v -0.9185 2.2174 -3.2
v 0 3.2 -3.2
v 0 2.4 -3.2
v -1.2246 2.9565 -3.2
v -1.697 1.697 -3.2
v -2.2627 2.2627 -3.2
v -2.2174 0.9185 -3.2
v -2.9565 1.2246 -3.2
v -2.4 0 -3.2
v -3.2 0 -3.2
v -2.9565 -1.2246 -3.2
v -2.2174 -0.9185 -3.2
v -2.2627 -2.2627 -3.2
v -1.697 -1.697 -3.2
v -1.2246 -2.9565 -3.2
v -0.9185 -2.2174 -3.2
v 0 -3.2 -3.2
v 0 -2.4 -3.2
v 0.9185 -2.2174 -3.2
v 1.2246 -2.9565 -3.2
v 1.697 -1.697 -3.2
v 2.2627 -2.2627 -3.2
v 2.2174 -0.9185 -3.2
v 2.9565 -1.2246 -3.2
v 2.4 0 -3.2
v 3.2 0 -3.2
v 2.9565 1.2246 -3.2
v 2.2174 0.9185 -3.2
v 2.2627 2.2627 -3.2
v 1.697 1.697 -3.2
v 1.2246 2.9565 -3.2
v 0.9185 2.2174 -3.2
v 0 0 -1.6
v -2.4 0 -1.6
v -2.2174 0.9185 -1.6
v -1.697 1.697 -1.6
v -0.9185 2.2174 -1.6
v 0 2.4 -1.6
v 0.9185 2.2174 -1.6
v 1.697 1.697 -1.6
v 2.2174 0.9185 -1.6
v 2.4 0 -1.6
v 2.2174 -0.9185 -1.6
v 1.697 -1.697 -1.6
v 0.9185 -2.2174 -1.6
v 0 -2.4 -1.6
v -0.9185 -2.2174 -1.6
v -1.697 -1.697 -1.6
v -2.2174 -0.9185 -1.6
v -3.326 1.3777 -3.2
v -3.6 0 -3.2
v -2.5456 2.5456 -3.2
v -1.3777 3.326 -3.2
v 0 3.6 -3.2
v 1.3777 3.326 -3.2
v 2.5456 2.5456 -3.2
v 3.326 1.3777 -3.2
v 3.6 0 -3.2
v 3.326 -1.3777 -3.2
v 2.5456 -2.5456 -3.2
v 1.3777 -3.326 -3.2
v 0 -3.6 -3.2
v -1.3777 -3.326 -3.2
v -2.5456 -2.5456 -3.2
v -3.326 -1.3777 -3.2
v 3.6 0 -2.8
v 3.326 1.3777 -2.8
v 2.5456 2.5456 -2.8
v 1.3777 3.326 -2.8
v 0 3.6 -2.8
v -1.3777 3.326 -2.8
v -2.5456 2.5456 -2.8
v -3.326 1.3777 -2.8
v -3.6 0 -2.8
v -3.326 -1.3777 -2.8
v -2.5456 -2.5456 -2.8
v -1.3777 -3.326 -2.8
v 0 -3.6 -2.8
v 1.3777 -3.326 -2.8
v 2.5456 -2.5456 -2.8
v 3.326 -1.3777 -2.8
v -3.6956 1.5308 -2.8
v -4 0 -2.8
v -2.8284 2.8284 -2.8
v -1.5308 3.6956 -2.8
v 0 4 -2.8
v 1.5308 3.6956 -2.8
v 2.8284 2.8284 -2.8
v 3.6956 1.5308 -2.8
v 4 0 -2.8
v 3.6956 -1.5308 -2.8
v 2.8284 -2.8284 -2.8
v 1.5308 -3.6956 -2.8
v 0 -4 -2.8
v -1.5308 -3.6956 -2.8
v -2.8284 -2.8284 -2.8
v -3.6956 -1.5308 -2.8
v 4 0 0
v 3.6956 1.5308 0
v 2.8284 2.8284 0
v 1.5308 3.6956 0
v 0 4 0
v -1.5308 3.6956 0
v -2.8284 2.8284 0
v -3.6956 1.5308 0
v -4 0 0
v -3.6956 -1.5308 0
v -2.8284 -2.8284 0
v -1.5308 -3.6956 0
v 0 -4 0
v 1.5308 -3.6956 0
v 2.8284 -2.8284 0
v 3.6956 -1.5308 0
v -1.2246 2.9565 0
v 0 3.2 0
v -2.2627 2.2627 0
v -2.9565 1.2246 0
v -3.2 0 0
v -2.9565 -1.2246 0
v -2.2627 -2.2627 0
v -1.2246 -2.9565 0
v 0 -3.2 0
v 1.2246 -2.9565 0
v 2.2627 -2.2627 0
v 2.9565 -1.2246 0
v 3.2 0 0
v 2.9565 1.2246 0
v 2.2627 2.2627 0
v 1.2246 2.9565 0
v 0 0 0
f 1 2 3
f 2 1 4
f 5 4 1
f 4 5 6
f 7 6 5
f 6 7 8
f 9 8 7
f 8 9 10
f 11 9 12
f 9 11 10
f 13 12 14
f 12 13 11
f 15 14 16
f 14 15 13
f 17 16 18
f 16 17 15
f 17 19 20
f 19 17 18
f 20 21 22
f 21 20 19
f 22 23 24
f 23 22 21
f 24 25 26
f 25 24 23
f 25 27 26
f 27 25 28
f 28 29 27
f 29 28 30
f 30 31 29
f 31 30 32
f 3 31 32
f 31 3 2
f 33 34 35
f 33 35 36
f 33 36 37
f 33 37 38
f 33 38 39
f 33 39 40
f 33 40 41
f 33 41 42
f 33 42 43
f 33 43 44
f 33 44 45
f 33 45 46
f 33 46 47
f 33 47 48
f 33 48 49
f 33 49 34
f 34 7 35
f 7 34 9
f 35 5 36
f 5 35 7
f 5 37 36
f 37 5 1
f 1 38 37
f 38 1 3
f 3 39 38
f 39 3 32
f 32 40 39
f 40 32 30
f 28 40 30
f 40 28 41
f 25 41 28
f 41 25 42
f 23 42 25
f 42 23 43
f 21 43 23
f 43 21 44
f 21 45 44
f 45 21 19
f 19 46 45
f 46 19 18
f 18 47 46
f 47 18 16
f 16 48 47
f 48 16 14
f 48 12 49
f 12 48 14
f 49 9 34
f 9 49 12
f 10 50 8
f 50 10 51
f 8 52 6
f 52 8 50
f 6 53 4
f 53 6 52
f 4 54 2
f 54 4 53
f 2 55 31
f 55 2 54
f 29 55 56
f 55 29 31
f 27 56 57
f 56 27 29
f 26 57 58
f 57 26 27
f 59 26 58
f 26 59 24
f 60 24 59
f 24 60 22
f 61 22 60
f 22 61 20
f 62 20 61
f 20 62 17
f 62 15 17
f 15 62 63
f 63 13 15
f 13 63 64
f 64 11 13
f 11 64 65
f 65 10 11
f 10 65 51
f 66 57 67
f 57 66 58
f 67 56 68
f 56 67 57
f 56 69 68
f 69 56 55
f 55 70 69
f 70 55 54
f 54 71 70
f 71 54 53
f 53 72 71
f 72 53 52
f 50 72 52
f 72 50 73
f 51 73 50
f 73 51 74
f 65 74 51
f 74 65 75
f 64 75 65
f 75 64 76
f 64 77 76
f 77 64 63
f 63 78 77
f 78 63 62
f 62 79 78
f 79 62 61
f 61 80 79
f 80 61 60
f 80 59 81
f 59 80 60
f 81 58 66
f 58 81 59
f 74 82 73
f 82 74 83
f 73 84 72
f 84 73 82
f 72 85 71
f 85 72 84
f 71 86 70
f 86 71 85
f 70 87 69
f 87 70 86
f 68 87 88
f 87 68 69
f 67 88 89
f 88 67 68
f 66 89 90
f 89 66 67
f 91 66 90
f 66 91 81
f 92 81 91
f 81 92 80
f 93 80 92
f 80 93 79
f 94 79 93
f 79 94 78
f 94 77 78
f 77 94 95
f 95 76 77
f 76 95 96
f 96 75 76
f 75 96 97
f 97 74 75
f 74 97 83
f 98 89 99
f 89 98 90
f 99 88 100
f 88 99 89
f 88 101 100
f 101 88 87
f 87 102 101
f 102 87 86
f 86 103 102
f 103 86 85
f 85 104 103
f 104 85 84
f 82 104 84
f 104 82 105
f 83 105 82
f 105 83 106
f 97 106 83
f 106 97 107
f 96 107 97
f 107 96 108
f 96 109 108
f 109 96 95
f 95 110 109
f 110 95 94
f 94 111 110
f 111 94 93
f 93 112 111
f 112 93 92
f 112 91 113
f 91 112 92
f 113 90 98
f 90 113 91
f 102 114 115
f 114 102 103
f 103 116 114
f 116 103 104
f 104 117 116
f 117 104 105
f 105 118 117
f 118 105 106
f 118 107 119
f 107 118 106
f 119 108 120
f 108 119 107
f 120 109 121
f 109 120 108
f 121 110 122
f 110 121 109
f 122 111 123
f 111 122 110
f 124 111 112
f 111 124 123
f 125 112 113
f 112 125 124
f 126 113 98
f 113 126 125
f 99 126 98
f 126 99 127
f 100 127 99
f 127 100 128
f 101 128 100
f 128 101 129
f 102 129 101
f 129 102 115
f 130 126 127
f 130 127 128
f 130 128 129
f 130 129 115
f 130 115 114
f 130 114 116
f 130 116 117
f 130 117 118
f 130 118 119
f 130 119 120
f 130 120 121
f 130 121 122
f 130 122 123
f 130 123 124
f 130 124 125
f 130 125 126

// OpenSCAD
// file: ../p/4-4ring3.scad
use <../lib.scad>
function ldraw_lib__4_4ring3() = [
// 0 Ring  3 x 1.0
// 0 Name: 4-4ring3.dat
// 0 Author: James Jessiman
// 0 !LDRAW_ORG Primitive UPDATE 2009-01
// 0 !LICENSE Licensed under CC BY 4.0 : see CAreadme.txt
// 
// 0 BFC CERTIFY CCW
  [0,"BFC","CERTIFY"],
  [0,"BFC","CCW"],
// 
// 0 !HISTORY 1998-12-15 [PTadmin] Official Update 1998-10
// 0 !HISTORY 2002-04-05 [hafhead] Added BFC statement
// 0 !HISTORY 2002-04-25 [PTadmin] Official Update 2002-02
// 0 !HISTORY 2007-06-24 [PTadmin] Header formatted for Contributor Agreement
// 0 !HISTORY 2008-07-01 [PTadmin] Official Update 2008-01
// 0 !HISTORY 2008-08-26 [cwdee] Switch polygon winding and rename
// 0 !HISTORY 2009-05-02 [PTadmin] Official Update 2009-01
// 
// 
// 4 16 -1.5308 0 3.6956 -1.1481 0 2.7717 0 0 3 0 0 4
  [4,16,-1.5308,0,3.6956,-1.1481,0,2.7717,0,0,3,0,0,4],
// 4 16 -2.8284 0 2.8284 -2.1213 0 2.1213 -1.1481 0 2.7717 -1.5308 0 3.6956
  [4,16,-2.8284,0,2.8284,-2.1213,0,2.1213,-1.1481,0,2.7717,-1.5308,0,3.6956],
// 4 16 -3.6956 0 1.5308 -2.7717 0 1.1481 -2.1213 0 2.1213 -2.8284 0 2.8284
  [4,16,-3.6956,0,1.5308,-2.7717,0,1.1481,-2.1213,0,2.1213,-2.8284,0,2.8284],
// 4 16 -4 0 0 -3 0 0 -2.7717 0 1.1481 -3.6956 0 1.5308
  [4,16,-4,0,0,-3,0,0,-2.7717,0,1.1481,-3.6956,0,1.5308],
// 4 16 -3.6956 0 -1.5308 -2.7717 0 -1.1481 -3 0 0 -4 0 0
  [4,16,-3.6956,0,-1.5308,-2.7717,0,-1.1481,-3,0,0,-4,0,0],
// 4 16 -2.8284 0 -2.8284 -2.1213 0 -2.1213 -2.7717 0 -1.1481 -3.6956 0 -1.5308
  [4,16,-2.8284,0,-2.8284,-2.1213,0,-2.1213,-2.7717,0,-1.1481,-3.6956,0,-1.5308],
// 4 16 -1.5308 0 -3.6956 -1.1481 0 -2.7717 -2.1213 0 -2.1213 -2.8284 0 -2.8284
  [4,16,-1.5308,0,-3.6956,-1.1481,0,-2.7717,-2.1213,0,-2.1213,-2.8284,0,-2.8284],
// 4 16 0 0 -4 0 0 -3 -1.1481 0 -2.7717 -1.5308 0 -3.6956
  [4,16,0,0,-4,0,0,-3,-1.1481,0,-2.7717,-1.5308,0,-3.6956],
// 4 16 1.5308 0 -3.6956 1.1481 0 -2.7717 0 0 -3 0 0 -4
  [4,16,1.5308,0,-3.6956,1.1481,0,-2.7717,0,0,-3,0,0,-4],
// 4 16 2.8284 0 -2.8284 2.1213 0 -2.1213 1.1481 0 -2.7717 1.5308 0 -3.6956
  [4,16,2.8284,0,-2.8284,2.1213,0,-2.1213,1.1481,0,-2.7717,1.5308,0,-3.6956],
// 4 16 3.6956 0 -1.5308 2.7717 0 -1.1481 2.1213 0 -2.1213 2.8284 0 -2.8284
  [4,16,3.6956,0,-1.5308,2.7717,0,-1.1481,2.1213,0,-2.1213,2.8284,0,-2.8284],
// 4 16 4 0 0 3 0 0 2.7717 0 -1.1481 3.6956 0 -1.5308
  [4,16,4,0,0,3,0,0,2.7717,0,-1.1481,3.6956,0,-1.5308],
// 4 16 3.6956 0 1.5308 2.7717 0 1.1481 3 0 0 4 0 0
  [4,16,3.6956,0,1.5308,2.7717,0,1.1481,3,0,0,4,0,0],
// 4 16 2.8284 0 2.8284 2.1213 0 2.1213 2.7717 0 1.1481 3.6956 0 1.5308
  [4,16,2.8284,0,2.8284,2.1213,0,2.1213,2.7717,0,1.1481,3.6956,0,1.5308],
// 4 16 1.5308 0 3.6956 1.1481 0 2.7717 2.1213 0 2.1213 2.8284 0 2.8284
  [4,16,1.5308,0,3.6956,1.1481,0,2.7717,2.1213,0,2.1213,2.8284,0,2.8284],
// 4 16 0 0 4 0 0 3 1.1481 0 2.7717 1.5308 0 3.6956
  [4,16,0,0,4,0,0,3,1.1481,0,2.7717,1.5308,0,3.6956],
// 0
];
module ldraw_lib__4_4ring3(step=0, col=false, unit=2/5, alt=false, line=0.2, solid=!$preview)
    makepoly(ldraw_lib__4_4ring3(), step=step, col=col, unit=unit, alt=alt, line=line, solid=solid);
ldraw_lib__4_4ring3(line=0.2);
// file: ../p/4-4cylc.scad
use <../lib.scad>
use <4-4cyli.scad>
use <4-4disc.scad>
use <4-4edge.scad>
function ldraw_lib__4_4cylc() = [
// 0 Cylinder Closed 1.0
// 0 Name: 4-4cylc.dat
// 0 Author: Alex Taylor [anathema]
// 0 !LDRAW_ORG Primitive UPDATE 2009-02
// 0 !LICENSE Licensed under CC BY 4.0 : see CAreadme.txt
// 
// 0 BFC CERTIFY CCW
  [0,"BFC","CERTIFY"],
  [0,"BFC","CCW"],
// 
// 0 !HISTORY 2008-12-29 [cwdee] Removed one disc
// 0 !HISTORY 2009-09-03 [PTadmin] Official Update 2009-02
// 
// 
// 1 16 0 0 0 1 0 0 0 1 0 0 0 1 4-4edge.dat
  [1,16,0,0,0,1,0,0,0,1,0,0,0,1, ldraw_lib__4_4edge()],
// 1 16 0 1 0 1 0 0 0 1 0 0 0 1 4-4edge.dat
  [1,16,0,1,0,1,0,0,0,1,0,0,0,1, ldraw_lib__4_4edge()],
// 1 16 0 0 0 1 0 0 0 1 0 0 0 1 4-4disc.dat
  [1,16,0,0,0,1,0,0,0,1,0,0,0,1, ldraw_lib__4_4disc()],
// 1 16 0 0 0 1 0 0 0 1 0 0 0 1 4-4cyli.dat
  [1,16,0,0,0,1,0,0,0,1,0,0,0,1, ldraw_lib__4_4cyli()],
// 0
];
module ldraw_lib__4_4cylc(step=0, col=false, unit=2/5, alt=false, line=0.2, solid=!$preview)
    makepoly(ldraw_lib__4_4cylc(), step=step, col=col, unit=unit, alt=alt, line=line, solid=solid);
ldraw_lib__4_4cylc(line=0.2);
// file: ../p/4-4edge.scad
use <../lib.scad>
function ldraw_lib__4_4edge() = [
// 0 Circle 1.0
// 0 Name: 4-4edge.dat
// 0 Author: James Jessiman
// 0 !LDRAW_ORG Primitive UPDATE 2017-01
// 0 !LICENSE Licensed under CC BY 4.0 : see CAreadme.txt
// 
// 0 BFC CERTIFY CCW
  [0,"BFC","CERTIFY"],
  [0,"BFC","CCW"],
// 
// 0 !HISTORY 1998-12-15 [PTadmin] Official Update 1998-10
// 0 !HISTORY 2005-12-28 [PTadmin] Official Update 2005-01
// 0 !HISTORY 2007-06-24 [PTadmin] Header formatted for Contributor Agreement
// 0 !HISTORY 2008-07-01 [PTadmin] Official Update 2008-01
// 0 !HISTORY 2017-01-15 [Steffen] BFCed
// 0 !HISTORY 2017-12-30 [PTadmin] Official Update 2017-01
// 
// 
// 2 24 1 0 0 0.9239 0 0.3827
  [2,24,1,0,0,0.9239,0,0.3827],
// 2 24 0.9239 0 0.3827 0.7071 0 0.7071
  [2,24,0.9239,0,0.3827,0.7071,0,0.7071],
// 2 24 0.7071 0 0.7071 0.3827 0 0.9239
  [2,24,0.7071,0,0.7071,0.3827,0,0.9239],
// 2 24 0.3827 0 0.9239 0 0 1
  [2,24,0.3827,0,0.9239,0,0,1],
// 2 24 0 0 1 -0.3827 0 0.9239
  [2,24,0,0,1,-0.3827,0,0.9239],
// 2 24 -0.3827 0 0.9239 -0.7071 0 0.7071
  [2,24,-0.3827,0,0.9239,-0.7071,0,0.7071],
// 2 24 -0.7071 0 0.7071 -0.9239 0 0.3827
  [2,24,-0.7071,0,0.7071,-0.9239,0,0.3827],
// 2 24 -0.9239 0 0.3827 -1 0 -0
  [2,24,-0.9239,0,0.3827,-1,0,-0],
// 2 24 -1 0 -0 -0.9239 0 -0.3827
  [2,24,-1,0,-0,-0.9239,0,-0.3827],
// 2 24 -0.9239 0 -0.3827 -0.7071 0 -0.7071
  [2,24,-0.9239,0,-0.3827,-0.7071,0,-0.7071],
// 2 24 -0.7071 0 -0.7071 -0.3827 0 -0.9239
  [2,24,-0.7071,0,-0.7071,-0.3827,0,-0.9239],
// 2 24 -0.3827 0 -0.9239 0 0 -1
  [2,24,-0.3827,0,-0.9239,0,0,-1],
// 2 24 0 0 -1 0.3827 0 -0.9239
  [2,24,0,0,-1,0.3827,0,-0.9239],
// 2 24 0.3827 0 -0.9239 0.7071 0 -0.7071
  [2,24,0.3827,0,-0.9239,0.7071,0,-0.7071],
// 2 24 0.7071 0 -0.7071 0.9239 0 -0.3827
  [2,24,0.7071,0,-0.7071,0.9239,0,-0.3827],
// 2 24 0.9239 0 -0.3827 1 0 0
  [2,24,0.9239,0,-0.3827,1,0,0],
];
module ldraw_lib__4_4edge(step=0, col=false, unit=2/5, alt=false, line=0.2, solid=!$preview)
    makepoly(ldraw_lib__4_4edge(), step=step, col=col, unit=unit, alt=alt, line=line, solid=solid);
ldraw_lib__4_4edge(line=0.2);
// file: ../p/4-4cyli.scad
use <../lib.scad>
function ldraw_lib__4_4cyli() = [
// 0 Cylinder 1.0
// 0 Name: 4-4cyli.dat
// 0 Author: James Jessiman
// 0 !LDRAW_ORG Primitive UPDATE 2005-01
// 0 !LICENSE Licensed under CC BY 4.0 : see CAreadme.txt
// 
// 0 BFC CERTIFY CCW
  [0,"BFC","CERTIFY"],
  [0,"BFC","CCW"],
// 
// 0 !HISTORY 1998-12-15 [PTadmin] Official Update 1998-10
// 0 !HISTORY 2002-03-23 [sbliss] Added BFC statement; merged headers from files in distributions LDraw 0.27 and Complete.
// 0 !HISTORY 2002-04-25 [PTadmin] Official Update 2002-02
// 0 !HISTORY 2004-12-14 [guyvivan] BFC CCW
// 0 !HISTORY 2005-12-28 [PTadmin] Official Update 2005-01
// 0 !HISTORY 2007-06-24 [PTadmin] Header formatted for Contributor Agreement
// 0 !HISTORY 2008-07-01 [PTadmin] Official Update 2008-01
// 
// 
// 4 16 1 1 0 0.9239 1 0.3827 0.9239 0 0.3827 1 0 0
  [4,16,1,1,0,0.9239,1,0.3827,0.9239,0,0.3827,1,0,0],
// 5 24 1 0 0 1 1 0 0.9239 0 0.3827 0.9239 0 -0.3827
  [5,24,1,0,0,1,1,0,0.9239,0,0.3827,0.9239,0,-0.3827],
// 4 16 0.9239 1 0.3827 0.7071 1 0.7071 0.7071 0 0.7071 0.9239 0 0.3827
  [4,16,0.9239,1,0.3827,0.7071,1,0.7071,0.7071,0,0.7071,0.9239,0,0.3827],
// 5 24 0.9239 0 0.3827 0.9239 1 0.3827 0.7071 0 0.7071 1 0 0
  [5,24,0.9239,0,0.3827,0.9239,1,0.3827,0.7071,0,0.7071,1,0,0],
// 4 16 0.7071 1 0.7071 0.3827 1 0.9239 0.3827 0 0.9239 0.7071 0 0.7071
  [4,16,0.7071,1,0.7071,0.3827,1,0.9239,0.3827,0,0.9239,0.7071,0,0.7071],
// 5 24 0.7071 0 0.7071 0.7071 1 0.7071 0.3827 0 0.9239 0.9239 0 0.3827
  [5,24,0.7071,0,0.7071,0.7071,1,0.7071,0.3827,0,0.9239,0.9239,0,0.3827],
// 4 16 0.3827 1 0.9239 0 1 1 0 0 1 0.3827 0 0.9239
  [4,16,0.3827,1,0.9239,0,1,1,0,0,1,0.3827,0,0.9239],
// 5 24 0.3827 0 0.9239 0.3827 1 0.9239 0 0 1 0.7071 0 0.7071
  [5,24,0.3827,0,0.9239,0.3827,1,0.9239,0,0,1,0.7071,0,0.7071],
// 4 16 0 1 1 -0.3827 1 0.9239 -0.3827 0 0.9239 0 0 1
  [4,16,0,1,1,-0.3827,1,0.9239,-0.3827,0,0.9239,0,0,1],
// 5 24 0 0 1 0 1 1 -0.3827 0 0.9239 0.3827 0 0.9239
  [5,24,0,0,1,0,1,1,-0.3827,0,0.9239,0.3827,0,0.9239],
// 4 16 -0.3827 1 0.9239 -0.7071 1 0.7071 -0.7071 0 0.7071 -0.3827 0 0.9239
  [4,16,-0.3827,1,0.9239,-0.7071,1,0.7071,-0.7071,0,0.7071,-0.3827,0,0.9239],
// 5 24 -0.3827 0 0.9239 -0.3827 1 0.9239 -0.7071 0 0.7071 0 0 1
  [5,24,-0.3827,0,0.9239,-0.3827,1,0.9239,-0.7071,0,0.7071,0,0,1],
// 4 16 -0.7071 1 0.7071 -0.9239 1 0.3827 -0.9239 0 0.3827 -0.7071 0 0.7071
  [4,16,-0.7071,1,0.7071,-0.9239,1,0.3827,-0.9239,0,0.3827,-0.7071,0,0.7071],
// 5 24 -0.7071 0 0.7071 -0.7071 1 0.7071 -0.9239 0 0.3827 -0.3827 0 0.9239
  [5,24,-0.7071,0,0.7071,-0.7071,1,0.7071,-0.9239,0,0.3827,-0.3827,0,0.9239],
// 4 16 -0.9239 1 0.3827 -1 1 0 -1 0 0 -0.9239 0 0.3827
  [4,16,-0.9239,1,0.3827,-1,1,0,-1,0,0,-0.9239,0,0.3827],
// 5 24 -0.9239 0 0.3827 -0.9239 1 0.3827 -1 0 0 -0.7071 0 0.7071
  [5,24,-0.9239,0,0.3827,-0.9239,1,0.3827,-1,0,0,-0.7071,0,0.7071],
// 4 16 -1 1 0 -0.9239 1 -0.3827 -0.9239 0 -0.3827 -1 0 0
  [4,16,-1,1,0,-0.9239,1,-0.3827,-0.9239,0,-0.3827,-1,0,0],
// 5 24 -1 0 0 -1 1 0 -0.9239 0 -0.3827 -0.9239 0 0.3827
  [5,24,-1,0,0,-1,1,0,-0.9239,0,-0.3827,-0.9239,0,0.3827],
// 4 16 -0.9239 1 -0.3827 -0.7071 1 -0.7071 -0.7071 0 -0.7071 -0.9239 0 -0.3827
  [4,16,-0.9239,1,-0.3827,-0.7071,1,-0.7071,-0.7071,0,-0.7071,-0.9239,0,-0.3827],
// 5 24 -0.9239 0 -0.3827 -0.9239 1 -0.3827 -0.7071 0 -0.7071 -1 0 0
  [5,24,-0.9239,0,-0.3827,-0.9239,1,-0.3827,-0.7071,0,-0.7071,-1,0,0],
// 4 16 -0.7071 1 -0.7071 -0.3827 1 -0.9239 -0.3827 0 -0.9239 -0.7071 0 -0.7071
  [4,16,-0.7071,1,-0.7071,-0.3827,1,-0.9239,-0.3827,0,-0.9239,-0.7071,0,-0.7071],
// 5 24 -0.7071 0 -0.7071 -0.7071 1 -0.7071 -0.3827 0 -0.9239 -0.9239 0 -0.3827
  [5,24,-0.7071,0,-0.7071,-0.7071,1,-0.7071,-0.3827,0,-0.9239,-0.9239,0,-0.3827],
// 4 16 -0.3827 1 -0.9239 0 1 -1 0 0 -1 -0.3827 0 -0.9239
  [4,16,-0.3827,1,-0.9239,0,1,-1,0,0,-1,-0.3827,0,-0.9239],
// 5 24 -0.3827 0 -0.9239 -0.3827 1 -0.9239 0 0 -1 -0.7071 0 -0.7071
  [5,24,-0.3827,0,-0.9239,-0.3827,1,-0.9239,0,0,-1,-0.7071,0,-0.7071],
// 4 16 0 1 -1 0.3827 1 -0.9239 0.3827 0 -0.9239 0 0 -1
  [4,16,0,1,-1,0.3827,1,-0.9239,0.3827,0,-0.9239,0,0,-1],
// 5 24 0 0 -1 0 1 -1 0.3827 0 -0.9239 -0.3827 0 -0.9239
  [5,24,0,0,-1,0,1,-1,0.3827,0,-0.9239,-0.3827,0,-0.9239],
// 4 16 0.3827 1 -0.9239 0.7071 1 -0.7071 0.7071 0 -0.7071 0.3827 0 -0.9239
  [4,16,0.3827,1,-0.9239,0.7071,1,-0.7071,0.7071,0,-0.7071,0.3827,0,-0.9239],
// 5 24 0.3827 0 -0.9239 0.3827 1 -0.9239 0.7071 0 -0.7071 0 0 -1
  [5,24,0.3827,0,-0.9239,0.3827,1,-0.9239,0.7071,0,-0.7071,0,0,-1],
// 4 16 0.7071 1 -0.7071 0.9239 1 -0.3827 0.9239 0 -0.3827 0.7071 0 -0.7071
  [4,16,0.7071,1,-0.7071,0.9239,1,-0.3827,0.9239,0,-0.3827,0.7071,0,-0.7071],
// 5 24 0.7071 0 -0.7071 0.7071 1 -0.7071 0.9239 0 -0.3827 0.3827 0 -0.9239
  [5,24,0.7071,0,-0.7071,0.7071,1,-0.7071,0.9239,0,-0.3827,0.3827,0,-0.9239],
// 4 16 0.9239 1 -0.3827 1 1 0 1 0 0 0.9239 0 -0.3827
  [4,16,0.9239,1,-0.3827,1,1,0,1,0,0,0.9239,0,-0.3827],
// 5 24 0.9239 0 -0.3827 0.9239 1 -0.3827 1 0 0 0.7071 0 -0.7071
  [5,24,0.9239,0,-0.3827,0.9239,1,-0.3827,1,0,0,0.7071,0,-0.7071],
// 0
];
module ldraw_lib__4_4cyli(step=0, col=false, unit=2/5, alt=false, line=0.2, solid=!$preview)
    makepoly(ldraw_lib__4_4cyli(), step=step, col=col, unit=unit, alt=alt, line=line, solid=solid);
ldraw_lib__4_4cyli(line=0.2);
// file: ../p/stud4o.scad
use <../lib.scad>
use <4-4cylc.scad>
use <4-4ring3.scad>
function ldraw_lib__stud4o() = [
// 0 Stud Tube Open without Outer Cylinder
// 0 Name: stud4o.dat
// 0 Author: Magnus Forsberg [MagFors]
// 0 !LDRAW_ORG Primitive UPDATE 2011-02
// 0 !LICENSE Licensed under CC BY 4.0 : see CAreadme.txt
// 
// 0 !HELP This stud is a "antistud" to be used like a underside stud,
// 0 !HELP but without the outer cylinder.
// 0 !HELP 1 47 0 0 0 1 0 0 0 1 0 0 0 1 stud4.dat
// 
// 0 BFC CERTIFY CCW
  [0,"BFC","CERTIFY"],
  [0,"BFC","CCW"],
// 
// 0 !HISTORY 2011-12-29 [PTadmin] Official Update 2011-02
// 
// 
// 1 16 0 -4 0 2 0 0 0 1 0 0 0 2 4-4ring3.dat
  [1,16,0,-4,0,2,0,0,0,1,0,0,0,2, ldraw_lib__4_4ring3()],
// 0 BFC INVERTNEXT
  [0,"BFC","INVERTNEXT"],
// 1 16 0 0 0 -6 0 0 0 -4 0 0 0 6 4-4cylc.dat
  [1,16,0,0,0,-6,0,0,0,-4,0,0,0,6, ldraw_lib__4_4cylc()],
];
module ldraw_lib__stud4o(step=0, col=false, unit=2/5, alt=false, line=0.2, solid=!$preview)
    makepoly(ldraw_lib__stud4o(), step=step, col=col, unit=unit, alt=alt, line=line, solid=solid);
ldraw_lib__stud4o(line=0.2);
// file: ../p/4-4ring9.scad
use <../lib.scad>
function ldraw_lib__4_4ring9() = [
// 0 Ring  9 x 1.0
// 0 Name: 4-4ring9.dat
// 0 Author: Magnus Forsberg [MagFors]
// 0 !LDRAW_ORG Primitive UPDATE 2024-01
// 0 !LICENSE Licensed under CC BY 4.0 : see CAreadme.txt
// 
// 0 BFC CERTIFY CCW
  [0,"BFC","CERTIFY"],
  [0,"BFC","CCW"],
// 
// 0 !HISTORY 2004-04-22 [PTadmin] Official Update 2004-02
// 0 !HISTORY 2007-06-24 [PTadmin] Header formatted for Contributor Agreement
// 0 !HISTORY 2008-07-01 [PTadmin] Official Update 2008-01
// 0 !HISTORY 2024-01-04 [MagFors] Complete regeneration, original by jriley
// 0 !HISTORY 2024-01-29 [OrionP] Official Update 2024-01
// 
// 4 16 10 0 0 9.239 0 3.827 8.3151 0 3.4443 9 0 0
  [4,16,10,0,0,9.239,0,3.827,8.3151,0,3.4443,9,0,0],
// 4 16 9.239 0 3.827 7.071 0 7.071 6.3639 0 6.3639 8.3151 0 3.4443
  [4,16,9.239,0,3.827,7.071,0,7.071,6.3639,0,6.3639,8.3151,0,3.4443],
// 4 16 7.071 0 7.071 3.827 0 9.239 3.4443 0 8.3151 6.3639 0 6.3639
  [4,16,7.071,0,7.071,3.827,0,9.239,3.4443,0,8.3151,6.3639,0,6.3639],
// 4 16 3.827 0 9.239 0 0 10 0 0 9 3.4443 0 8.3151
  [4,16,3.827,0,9.239,0,0,10,0,0,9,3.4443,0,8.3151],
// 4 16 0 0 10 -3.827 0 9.239 -3.4443 0 8.3151 0 0 9
  [4,16,0,0,10,-3.827,0,9.239,-3.4443,0,8.3151,0,0,9],
// 4 16 -3.827 0 9.239 -7.071 0 7.071 -6.3639 0 6.3639 -3.4443 0 8.3151
  [4,16,-3.827,0,9.239,-7.071,0,7.071,-6.3639,0,6.3639,-3.4443,0,8.3151],
// 4 16 -7.071 0 7.071 -9.239 0 3.827 -8.3151 0 3.4443 -6.3639 0 6.3639
  [4,16,-7.071,0,7.071,-9.239,0,3.827,-8.3151,0,3.4443,-6.3639,0,6.3639],
// 4 16 -9.239 0 3.827 -10 0 0 -9 0 0 -8.3151 0 3.4443
  [4,16,-9.239,0,3.827,-10,0,0,-9,0,0,-8.3151,0,3.4443],
// 4 16 -10 0 0 -9.239 0 -3.827 -8.3151 0 -3.4443 -9 0 0
  [4,16,-10,0,0,-9.239,0,-3.827,-8.3151,0,-3.4443,-9,0,0],
// 4 16 -9.239 0 -3.827 -7.071 0 -7.071 -6.3639 0 -6.3639 -8.3151 0 -3.4443
  [4,16,-9.239,0,-3.827,-7.071,0,-7.071,-6.3639,0,-6.3639,-8.3151,0,-3.4443],
// 4 16 -7.071 0 -7.071 -3.827 0 -9.239 -3.4443 0 -8.3151 -6.3639 0 -6.3639
  [4,16,-7.071,0,-7.071,-3.827,0,-9.239,-3.4443,0,-8.3151,-6.3639,0,-6.3639],
// 4 16 -3.827 0 -9.239 0 0 -10 0 0 -9 -3.4443 0 -8.3151
  [4,16,-3.827,0,-9.239,0,0,-10,0,0,-9,-3.4443,0,-8.3151],
// 4 16 0 0 -10 3.827 0 -9.239 3.4443 0 -8.3151 0 0 -9
  [4,16,0,0,-10,3.827,0,-9.239,3.4443,0,-8.3151,0,0,-9],
// 4 16 3.827 0 -9.239 7.071 0 -7.071 6.3639 0 -6.3639 3.4443 0 -8.3151
  [4,16,3.827,0,-9.239,7.071,0,-7.071,6.3639,0,-6.3639,3.4443,0,-8.3151],
// 4 16 7.071 0 -7.071 9.239 0 -3.827 8.3151 0 -3.4443 6.3639 0 -6.3639
  [4,16,7.071,0,-7.071,9.239,0,-3.827,8.3151,0,-3.4443,6.3639,0,-6.3639],
// 4 16 9.239 0 -3.827 10 0 0 9 0 0 8.3151 0 -3.4443
  [4,16,9.239,0,-3.827,10,0,0,9,0,0,8.3151,0,-3.4443],
// 0 // Build by LDPartEditor (PrimGen 2.X)
];
module ldraw_lib__4_4ring9(step=0, col=false, unit=2/5, alt=false, line=0.2, solid=!$preview)
    makepoly(ldraw_lib__4_4ring9(), step=step, col=col, unit=unit, alt=alt, line=line, solid=solid);
ldraw_lib__4_4ring9(line=0.2);
// file: ../p/4-4ring8.scad
use <../lib.scad>
function ldraw_lib__4_4ring8() = [
// 0 Ring  8 x 1.0
// 0 Name: 4-4ring8.dat
// 0 Author: Steffen [Steffen]
// 0 !LDRAW_ORG Primitive UPDATE 2012-01
// 0 !LICENSE Licensed under CC BY 4.0 : see CAreadme.txt
// 
// 0 BFC CERTIFY CCW
  [0,"BFC","CERTIFY"],
  [0,"BFC","CCW"],
// 
// 0 !HISTORY 2003-12-19 [PTadmin] Official Update 2003-03
// 0 !HISTORY 2007-06-24 [PTadmin] Header formatted for Contributor Agreement
// 0 !HISTORY 2008-07-01 [PTadmin] Official Update 2008-01
// 0 !HISTORY 2012-02-16 [Philo] Changed to CCW
// 0 !HISTORY 2012-03-30 [PTadmin] Official Update 2012-01
// 
// 
// 4 16 9 0 0 8.3151 0 3.4443 7.3912 0 3.0616 8 0 0
  [4,16,9,0,0,8.3151,0,3.4443,7.3912,0,3.0616,8,0,0],
// 4 16 8.3151 0 3.4443 6.3639 0 6.3639 5.6568 0 5.6568 7.3912 0 3.0616
  [4,16,8.3151,0,3.4443,6.3639,0,6.3639,5.6568,0,5.6568,7.3912,0,3.0616],
// 4 16 6.3639 0 6.3639 3.4443 0 8.3151 3.0616 0 7.3912 5.6568 0 5.6568
  [4,16,6.3639,0,6.3639,3.4443,0,8.3151,3.0616,0,7.3912,5.6568,0,5.6568],
// 4 16 3.4443 0 8.3151 0 0 9 0 0 8 3.0616 0 7.3912
  [4,16,3.4443,0,8.3151,0,0,9,0,0,8,3.0616,0,7.3912],
// 4 16 0 0 9 -3.4443 0 8.3151 -3.0616 0 7.3912 0 0 8
  [4,16,0,0,9,-3.4443,0,8.3151,-3.0616,0,7.3912,0,0,8],
// 4 16 -3.4443 0 8.3151 -6.3639 0 6.3639 -5.6568 0 5.6568 -3.0616 0 7.3912
  [4,16,-3.4443,0,8.3151,-6.3639,0,6.3639,-5.6568,0,5.6568,-3.0616,0,7.3912],
// 4 16 -6.3639 0 6.3639 -8.3151 0 3.4443 -7.3912 0 3.0616 -5.6568 0 5.6568
  [4,16,-6.3639,0,6.3639,-8.3151,0,3.4443,-7.3912,0,3.0616,-5.6568,0,5.6568],
// 4 16 -8.3151 0 3.4443 -9 0 0 -8 0 0 -7.3912 0 3.0616
  [4,16,-8.3151,0,3.4443,-9,0,0,-8,0,0,-7.3912,0,3.0616],
// 4 16 -9 0 0 -8.3151 0 -3.4443 -7.3912 0 -3.0616 -8 0 0
  [4,16,-9,0,0,-8.3151,0,-3.4443,-7.3912,0,-3.0616,-8,0,0],
// 4 16 -8.3151 0 -3.4443 -6.3639 0 -6.3639 -5.6568 0 -5.6568 -7.3912 0 -3.0616
  [4,16,-8.3151,0,-3.4443,-6.3639,0,-6.3639,-5.6568,0,-5.6568,-7.3912,0,-3.0616],
// 4 16 -6.3639 0 -6.3639 -3.4443 0 -8.3151 -3.0616 0 -7.3912 -5.6568 0 -5.6568
  [4,16,-6.3639,0,-6.3639,-3.4443,0,-8.3151,-3.0616,0,-7.3912,-5.6568,0,-5.6568],
// 4 16 -3.4443 0 -8.3151 0 0 -9 0 0 -8 -3.0616 0 -7.3912
  [4,16,-3.4443,0,-8.3151,0,0,-9,0,0,-8,-3.0616,0,-7.3912],
// 4 16 0 0 -9 3.4443 0 -8.3151 3.0616 0 -7.3912 0 0 -8
  [4,16,0,0,-9,3.4443,0,-8.3151,3.0616,0,-7.3912,0,0,-8],
// 4 16 3.4443 0 -8.3151 6.3639 0 -6.3639 5.6568 0 -5.6568 3.0616 0 -7.3912
  [4,16,3.4443,0,-8.3151,6.3639,0,-6.3639,5.6568,0,-5.6568,3.0616,0,-7.3912],
// 4 16 6.3639 0 -6.3639 8.3151 0 -3.4443 7.3912 0 -3.0616 5.6568 0 -5.6568
  [4,16,6.3639,0,-6.3639,8.3151,0,-3.4443,7.3912,0,-3.0616,5.6568,0,-5.6568],
// 4 16 8.3151 0 -3.4443 9 0 0 8 0 0 7.3912 0 -3.0616
  [4,16,8.3151,0,-3.4443,9,0,0,8,0,0,7.3912,0,-3.0616],
];
module ldraw_lib__4_4ring8(step=0, col=false, unit=2/5, alt=false, line=0.2, solid=!$preview)
    makepoly(ldraw_lib__4_4ring8(), step=step, col=col, unit=unit, alt=alt, line=line, solid=solid);
ldraw_lib__4_4ring8(line=0.2);
// file: ../p/4-4cylo.scad
use <../lib.scad>
use <4-4cyli.scad>
use <4-4edge.scad>
function ldraw_lib__4_4cylo() = [
// 0 Cylinder Open 1.0
// 0 Name: 4-4cylo.dat
// 0 Author: Mark Kennedy [mkennedy]
// 0 !LDRAW_ORG Primitive UPDATE 2010-01
// 0 !LICENSE Licensed under CC BY 4.0 : see CAreadme.txt
// 
// 0 BFC CERTIFY CCW
  [0,"BFC","CERTIFY"],
  [0,"BFC","CCW"],
// 
// 0 !HISTORY 2010-04-05 [PTadmin] Official Update 2010-01
// 
// 
// 1 16 0 0 0 1 0 0 0 1 0 0 0 1 4-4edge.dat
  [1,16,0,0,0,1,0,0,0,1,0,0,0,1, ldraw_lib__4_4edge()],
// 1 16 0 1 0 1 0 0 0 1 0 0 0 1 4-4edge.dat
  [1,16,0,1,0,1,0,0,0,1,0,0,0,1, ldraw_lib__4_4edge()],
// 1 16 0 0 0 1 0 0 0 1 0 0 0 1 4-4cyli.dat
  [1,16,0,0,0,1,0,0,0,1,0,0,0,1, ldraw_lib__4_4cyli()],
// 0
];
module ldraw_lib__4_4cylo(step=0, col=false, unit=2/5, alt=false, line=0.2, solid=!$preview)
    makepoly(ldraw_lib__4_4cylo(), step=step, col=col, unit=unit, alt=alt, line=line, solid=solid);
ldraw_lib__4_4cylo(line=0.2);
// file: s/98138s02.scad
use <../../lib.scad>
use <../../p/4-4cylo.scad>
use <../../p/4-4ring8.scad>
use <../../p/4-4ring9.scad>
use <../../p/stud4o.scad>
function ldraw_lib__s__98138s02() = [
// 0 ~Tile  1 x  1 Round with Groove without Complete Top Face
// 0 Name: s\98138s02.dat
// 0 Author: Magnus Forsberg [MagFors]
// 0 !LDRAW_ORG Subpart UPDATE 2020-01
// 0 !LICENSE Licensed under CC BY 4.0 : see CAreadme.txt
// 
// 0 BFC CERTIFY CCW
  [0,"BFC","CERTIFY"],
  [0,"BFC","CCW"],
// 
// 0 !HISTORY 2020-06-28 [PTadmin] Official Update 2020-01
// 
// 
// 1 16 0 4 0 1 0 0 0 -1 0 0 0 1 stud4o.dat
  [1,16,0,4,0,1,0,0,0,-1,0,0,0,1, ldraw_lib__stud4o()],
// 1 16 0 8 0 -1 0 0 0 -1 0 0 0 1 4-4ring8.dat
  [1,16,0,8,0,-1,0,0,0,-1,0,0,0,1, ldraw_lib__4_4ring8()],
// 1 16 0 7 0 9 0 0 0 1 0 0 0 9 4-4cylo.dat
  [1,16,0,7,0,9,0,0,0,1,0,0,0,9, ldraw_lib__4_4cylo()],
// 1 16 0 7 0 -1 0 0 0 -1 0 0 0 1 4-4ring9.dat
  [1,16,0,7,0,-1,0,0,0,-1,0,0,0,1, ldraw_lib__4_4ring9()],
// 1 16 0 0 0 10 0 0 0 7 0 0 0 10 4-4cylo.dat
  [1,16,0,0,0,10,0,0,0,7,0,0,0,10, ldraw_lib__4_4cylo()],
];
module ldraw_lib__s__98138s02(step=0, col=false, unit=2/5, alt=false, line=0.2, solid=!$preview)
    makepoly(ldraw_lib__s__98138s02(), step=step, col=col, unit=unit, alt=alt, line=line, solid=solid);
ldraw_lib__s__98138s02(line=0.2);
// file: ../p/4-4ring4.scad
use <../lib.scad>
function ldraw_lib__4_4ring4() = [
// 0 Ring  4 x 1.0
// 0 Name: 4-4ring4.dat
// 0 Author: James Jessiman
// 0 !LDRAW_ORG Primitive UPDATE 2009-01
// 0 !LICENSE Licensed under CC BY 4.0 : see CAreadme.txt
// 
// 0 BFC CERTIFY CCW
  [0,"BFC","CERTIFY"],
  [0,"BFC","CCW"],
// 
// 0 !HISTORY 1998-12-15 [PTadmin] Official Update 1998-10
// 0 !HISTORY 2002-04-08 [BrickCaster] Modified for BFC compliance
// 0 !HISTORY 2002-04-25 [PTadmin] Official Update 2002-02
// 0 !HISTORY 2007-06-24 [PTadmin] Header formatted for Contributor Agreement
// 0 !HISTORY 2008-07-01 [PTadmin] Official Update 2008-01
// 0 !HISTORY 2008-08-26 [cwdee] Switch polygon winding and rename
// 0 !HISTORY 2009-05-02 [PTadmin] Official Update 2009-01
// 
// 
// 4 16 -1.9135 0 4.6195 -1.5308 0 3.6956 0 0 4 0 0 5
  [4,16,-1.9135,0,4.6195,-1.5308,0,3.6956,0,0,4,0,0,5],
// 4 16 -3.5355 0 3.5355 -2.8284 0 2.8284 -1.5308 0 3.6956 -1.9135 0 4.6195
  [4,16,-3.5355,0,3.5355,-2.8284,0,2.8284,-1.5308,0,3.6956,-1.9135,0,4.6195],
// 4 16 -4.6195 0 1.9135 -3.6956 0 1.5308 -2.8284 0 2.8284 -3.5355 0 3.5355
  [4,16,-4.6195,0,1.9135,-3.6956,0,1.5308,-2.8284,0,2.8284,-3.5355,0,3.5355],
// 4 16 -5 0 0 -4 0 0 -3.6956 0 1.5308 -4.6195 0 1.9135
  [4,16,-5,0,0,-4,0,0,-3.6956,0,1.5308,-4.6195,0,1.9135],
// 4 16 -4.6195 0 -1.9135 -3.6956 0 -1.5308 -4 0 0 -5 0 0
  [4,16,-4.6195,0,-1.9135,-3.6956,0,-1.5308,-4,0,0,-5,0,0],
// 4 16 -3.5355 0 -3.5355 -2.8284 0 -2.8284 -3.6956 0 -1.5308 -4.6195 0 -1.9135
  [4,16,-3.5355,0,-3.5355,-2.8284,0,-2.8284,-3.6956,0,-1.5308,-4.6195,0,-1.9135],
// 4 16 -1.9135 0 -4.6195 -1.5308 0 -3.6956 -2.8284 0 -2.8284 -3.5355 0 -3.5355
  [4,16,-1.9135,0,-4.6195,-1.5308,0,-3.6956,-2.8284,0,-2.8284,-3.5355,0,-3.5355],
// 4 16 0 0 -5 0 0 -4 -1.5308 0 -3.6956 -1.9135 0 -4.6195
  [4,16,0,0,-5,0,0,-4,-1.5308,0,-3.6956,-1.9135,0,-4.6195],
// 4 16 1.9135 0 -4.6195 1.5308 0 -3.6956 0 0 -4 0 0 -5
  [4,16,1.9135,0,-4.6195,1.5308,0,-3.6956,0,0,-4,0,0,-5],
// 4 16 3.5355 0 -3.5355 2.8284 0 -2.8284 1.5308 0 -3.6956 1.9135 0 -4.6195
  [4,16,3.5355,0,-3.5355,2.8284,0,-2.8284,1.5308,0,-3.6956,1.9135,0,-4.6195],
// 4 16 4.6195 0 -1.9135 3.6956 0 -1.5308 2.8284 0 -2.8284 3.5355 0 -3.5355
  [4,16,4.6195,0,-1.9135,3.6956,0,-1.5308,2.8284,0,-2.8284,3.5355,0,-3.5355],
// 4 16 5 0 0 4 0 0 3.6956 0 -1.5308 4.6195 0 -1.9135
  [4,16,5,0,0,4,0,0,3.6956,0,-1.5308,4.6195,0,-1.9135],
// 4 16 4.6195 0 1.9135 3.6956 0 1.5308 4 0 0 5 0 0
  [4,16,4.6195,0,1.9135,3.6956,0,1.5308,4,0,0,5,0,0],
// 4 16 3.5355 0 3.5355 2.8284 0 2.8284 3.6956 0 1.5308 4.6195 0 1.9135
  [4,16,3.5355,0,3.5355,2.8284,0,2.8284,3.6956,0,1.5308,4.6195,0,1.9135],
// 4 16 1.9135 0 4.6195 1.5308 0 3.6956 2.8284 0 2.8284 3.5355 0 3.5355
  [4,16,1.9135,0,4.6195,1.5308,0,3.6956,2.8284,0,2.8284,3.5355,0,3.5355],
// 4 16 0 0 5 0 0 4 1.5308 0 3.6956 1.9135 0 4.6195
  [4,16,0,0,5,0,0,4,1.5308,0,3.6956,1.9135,0,4.6195],
// 0
];
module ldraw_lib__4_4ring4(step=0, col=false, unit=2/5, alt=false, line=0.2, solid=!$preview)
    makepoly(ldraw_lib__4_4ring4(), step=step, col=col, unit=unit, alt=alt, line=line, solid=solid);
ldraw_lib__4_4ring4(line=0.2);
// file: ../p/4-4disc.scad
use <../lib.scad>
function ldraw_lib__4_4disc() = [
// 0 Disc 1.0
// 0 Name: 4-4disc.dat
// 0 Author: James Jessiman
// 0 !LDRAW_ORG Primitive UPDATE 2002-02
// 0 !LICENSE Licensed under CC BY 4.0 : see CAreadme.txt
// 
// 0 BFC CERTIFY CCW
  [0,"BFC","CERTIFY"],
  [0,"BFC","CCW"],
// 
// 0 !HISTORY 1998-12-15 [PTadmin] Official Update 1998-10
// 0 !HISTORY 2002-03-23 [sbliss] Added BFC statement
// 0 !HISTORY 2002-04-25 [PTadmin] Official Update 2002-02
// 0 !HISTORY 2007-06-24 [PTadmin] Header formatted for Contributor Agreement
// 0 !HISTORY 2008-07-01 [PTadmin] Official Update 2008-01
// 
// 
// 3 16 0 0 0 1 0 0 0.9239 0 0.3827
  [3,16,0,0,0,1,0,0,0.9239,0,0.3827],
// 3 16 0 0 0 0.9239 0 0.3827 0.7071 0 0.7071
  [3,16,0,0,0,0.9239,0,0.3827,0.7071,0,0.7071],
// 3 16 0 0 0 0.7071 0 0.7071 0.3827 0 0.9239
  [3,16,0,0,0,0.7071,0,0.7071,0.3827,0,0.9239],
// 3 16 0 0 0 0.3827 0 0.9239 0 0 1
  [3,16,0,0,0,0.3827,0,0.9239,0,0,1],
// 3 16 0 0 0 0 0 1 -0.3827 0 0.9239
  [3,16,0,0,0,0,0,1,-0.3827,0,0.9239],
// 3 16 0 0 0 -0.3827 0 0.9239 -0.7071 0 0.7071
  [3,16,0,0,0,-0.3827,0,0.9239,-0.7071,0,0.7071],
// 3 16 0 0 0 -0.7071 0 0.7071 -0.9239 0 0.3827
  [3,16,0,0,0,-0.7071,0,0.7071,-0.9239,0,0.3827],
// 3 16 0 0 0 -0.9239 0 0.3827 -1 0 -0
  [3,16,0,0,0,-0.9239,0,0.3827,-1,0,-0],
// 3 16 0 0 0 -1 0 -0 -0.9239 0 -0.3827
  [3,16,0,0,0,-1,0,-0,-0.9239,0,-0.3827],
// 3 16 0 0 0 -0.9239 0 -0.3827 -0.7071 0 -0.7071
  [3,16,0,0,0,-0.9239,0,-0.3827,-0.7071,0,-0.7071],
// 3 16 0 0 0 -0.7071 0 -0.7071 -0.3827 0 -0.9239
  [3,16,0,0,0,-0.7071,0,-0.7071,-0.3827,0,-0.9239],
// 3 16 0 0 0 -0.3827 0 -0.9239 0 0 -1
  [3,16,0,0,0,-0.3827,0,-0.9239,0,0,-1],
// 3 16 0 0 0 0 0 -1 0.3827 0 -0.9239
  [3,16,0,0,0,0,0,-1,0.3827,0,-0.9239],
// 3 16 0 0 0 0.3827 0 -0.9239 0.7071 0 -0.7071
  [3,16,0,0,0,0.3827,0,-0.9239,0.7071,0,-0.7071],
// 3 16 0 0 0 0.7071 0 -0.7071 0.9239 0 -0.3827
  [3,16,0,0,0,0.7071,0,-0.7071,0.9239,0,-0.3827],
// 3 16 0 0 0 0.9239 0 -0.3827 1 0 0
  [3,16,0,0,0,0.9239,0,-0.3827,1,0,0],
// 0
];
module ldraw_lib__4_4disc(step=0, col=false, unit=2/5, alt=false, line=0.2, solid=!$preview)
    makepoly(ldraw_lib__4_4disc(), step=step, col=col, unit=unit, alt=alt, line=line, solid=solid);
ldraw_lib__4_4disc(line=0.2);
// main file
use <../lib.scad>
use <../p/4-4disc.scad>
use <../p/4-4ring4.scad>
use <s/98138s02.scad>
function ldraw_lib__98138p38() = [
// 0 Tile  1 x  1 Round with Black Disc (16 LDU Diameter) Pattern
// 0 Name: 98138p38.dat
// 0 Author: Evert-Jan Boer [ejboer]
// 0 !LDRAW_ORG Part UPDATE 2025-10
// 0 !LICENSE Licensed under CC BY 4.0 : see CAreadme.txt
// 
// 0 BFC CERTIFY CCW
  [0,"BFC","CERTIFY"],
  [0,"BFC","CCW"],
// 
// 0 !KEYWORDS Bricklink 98138pb442, porthole, Rebrickable 98138pr0426, Set 10335
// 0 !KEYWORDS Set 40757, Side Scuttle, The Endurance
// 
// 0 !HISTORY 2025-06-26 [OrionP] Official Update 2025-06
// 0 !HISTORY 2025-10-25 [KnightOfTarenta] Name adapted to pattern family
// 0 !HISTORY 2025-10-27 [OrionP] Official Update 2025-10
// 
// 1 16 0 0 0 1 0 0 0 1 0 0 0 1 s\98138s02.dat
  [1,16,0,0,0,1,0,0,0,1,0,0,0,1, ldraw_lib__s__98138s02()],
// 1 16 0 0 0 2 0 0 0 1 0 0 0 2 4-4ring4.dat
  [1,16,0,0,0,2,0,0,0,1,0,0,0,2, ldraw_lib__4_4ring4()],
// 1 0 0 0 0 8 0 0 0 1 0 0 0 8 4-4disc.dat
  [1,0,0,0,0,8,0,0,0,1,0,0,0,8, ldraw_lib__4_4disc()],
];
module ldraw_lib__98138p38(step=0, col=false, unit=2/5, alt=false, line=0.2, solid=!$preview)
    makepoly(ldraw_lib__98138p38(), step=step, col=col, unit=unit, alt=alt, line=line, solid=solid);
ldraw_lib__98138p38(line=0.2);
